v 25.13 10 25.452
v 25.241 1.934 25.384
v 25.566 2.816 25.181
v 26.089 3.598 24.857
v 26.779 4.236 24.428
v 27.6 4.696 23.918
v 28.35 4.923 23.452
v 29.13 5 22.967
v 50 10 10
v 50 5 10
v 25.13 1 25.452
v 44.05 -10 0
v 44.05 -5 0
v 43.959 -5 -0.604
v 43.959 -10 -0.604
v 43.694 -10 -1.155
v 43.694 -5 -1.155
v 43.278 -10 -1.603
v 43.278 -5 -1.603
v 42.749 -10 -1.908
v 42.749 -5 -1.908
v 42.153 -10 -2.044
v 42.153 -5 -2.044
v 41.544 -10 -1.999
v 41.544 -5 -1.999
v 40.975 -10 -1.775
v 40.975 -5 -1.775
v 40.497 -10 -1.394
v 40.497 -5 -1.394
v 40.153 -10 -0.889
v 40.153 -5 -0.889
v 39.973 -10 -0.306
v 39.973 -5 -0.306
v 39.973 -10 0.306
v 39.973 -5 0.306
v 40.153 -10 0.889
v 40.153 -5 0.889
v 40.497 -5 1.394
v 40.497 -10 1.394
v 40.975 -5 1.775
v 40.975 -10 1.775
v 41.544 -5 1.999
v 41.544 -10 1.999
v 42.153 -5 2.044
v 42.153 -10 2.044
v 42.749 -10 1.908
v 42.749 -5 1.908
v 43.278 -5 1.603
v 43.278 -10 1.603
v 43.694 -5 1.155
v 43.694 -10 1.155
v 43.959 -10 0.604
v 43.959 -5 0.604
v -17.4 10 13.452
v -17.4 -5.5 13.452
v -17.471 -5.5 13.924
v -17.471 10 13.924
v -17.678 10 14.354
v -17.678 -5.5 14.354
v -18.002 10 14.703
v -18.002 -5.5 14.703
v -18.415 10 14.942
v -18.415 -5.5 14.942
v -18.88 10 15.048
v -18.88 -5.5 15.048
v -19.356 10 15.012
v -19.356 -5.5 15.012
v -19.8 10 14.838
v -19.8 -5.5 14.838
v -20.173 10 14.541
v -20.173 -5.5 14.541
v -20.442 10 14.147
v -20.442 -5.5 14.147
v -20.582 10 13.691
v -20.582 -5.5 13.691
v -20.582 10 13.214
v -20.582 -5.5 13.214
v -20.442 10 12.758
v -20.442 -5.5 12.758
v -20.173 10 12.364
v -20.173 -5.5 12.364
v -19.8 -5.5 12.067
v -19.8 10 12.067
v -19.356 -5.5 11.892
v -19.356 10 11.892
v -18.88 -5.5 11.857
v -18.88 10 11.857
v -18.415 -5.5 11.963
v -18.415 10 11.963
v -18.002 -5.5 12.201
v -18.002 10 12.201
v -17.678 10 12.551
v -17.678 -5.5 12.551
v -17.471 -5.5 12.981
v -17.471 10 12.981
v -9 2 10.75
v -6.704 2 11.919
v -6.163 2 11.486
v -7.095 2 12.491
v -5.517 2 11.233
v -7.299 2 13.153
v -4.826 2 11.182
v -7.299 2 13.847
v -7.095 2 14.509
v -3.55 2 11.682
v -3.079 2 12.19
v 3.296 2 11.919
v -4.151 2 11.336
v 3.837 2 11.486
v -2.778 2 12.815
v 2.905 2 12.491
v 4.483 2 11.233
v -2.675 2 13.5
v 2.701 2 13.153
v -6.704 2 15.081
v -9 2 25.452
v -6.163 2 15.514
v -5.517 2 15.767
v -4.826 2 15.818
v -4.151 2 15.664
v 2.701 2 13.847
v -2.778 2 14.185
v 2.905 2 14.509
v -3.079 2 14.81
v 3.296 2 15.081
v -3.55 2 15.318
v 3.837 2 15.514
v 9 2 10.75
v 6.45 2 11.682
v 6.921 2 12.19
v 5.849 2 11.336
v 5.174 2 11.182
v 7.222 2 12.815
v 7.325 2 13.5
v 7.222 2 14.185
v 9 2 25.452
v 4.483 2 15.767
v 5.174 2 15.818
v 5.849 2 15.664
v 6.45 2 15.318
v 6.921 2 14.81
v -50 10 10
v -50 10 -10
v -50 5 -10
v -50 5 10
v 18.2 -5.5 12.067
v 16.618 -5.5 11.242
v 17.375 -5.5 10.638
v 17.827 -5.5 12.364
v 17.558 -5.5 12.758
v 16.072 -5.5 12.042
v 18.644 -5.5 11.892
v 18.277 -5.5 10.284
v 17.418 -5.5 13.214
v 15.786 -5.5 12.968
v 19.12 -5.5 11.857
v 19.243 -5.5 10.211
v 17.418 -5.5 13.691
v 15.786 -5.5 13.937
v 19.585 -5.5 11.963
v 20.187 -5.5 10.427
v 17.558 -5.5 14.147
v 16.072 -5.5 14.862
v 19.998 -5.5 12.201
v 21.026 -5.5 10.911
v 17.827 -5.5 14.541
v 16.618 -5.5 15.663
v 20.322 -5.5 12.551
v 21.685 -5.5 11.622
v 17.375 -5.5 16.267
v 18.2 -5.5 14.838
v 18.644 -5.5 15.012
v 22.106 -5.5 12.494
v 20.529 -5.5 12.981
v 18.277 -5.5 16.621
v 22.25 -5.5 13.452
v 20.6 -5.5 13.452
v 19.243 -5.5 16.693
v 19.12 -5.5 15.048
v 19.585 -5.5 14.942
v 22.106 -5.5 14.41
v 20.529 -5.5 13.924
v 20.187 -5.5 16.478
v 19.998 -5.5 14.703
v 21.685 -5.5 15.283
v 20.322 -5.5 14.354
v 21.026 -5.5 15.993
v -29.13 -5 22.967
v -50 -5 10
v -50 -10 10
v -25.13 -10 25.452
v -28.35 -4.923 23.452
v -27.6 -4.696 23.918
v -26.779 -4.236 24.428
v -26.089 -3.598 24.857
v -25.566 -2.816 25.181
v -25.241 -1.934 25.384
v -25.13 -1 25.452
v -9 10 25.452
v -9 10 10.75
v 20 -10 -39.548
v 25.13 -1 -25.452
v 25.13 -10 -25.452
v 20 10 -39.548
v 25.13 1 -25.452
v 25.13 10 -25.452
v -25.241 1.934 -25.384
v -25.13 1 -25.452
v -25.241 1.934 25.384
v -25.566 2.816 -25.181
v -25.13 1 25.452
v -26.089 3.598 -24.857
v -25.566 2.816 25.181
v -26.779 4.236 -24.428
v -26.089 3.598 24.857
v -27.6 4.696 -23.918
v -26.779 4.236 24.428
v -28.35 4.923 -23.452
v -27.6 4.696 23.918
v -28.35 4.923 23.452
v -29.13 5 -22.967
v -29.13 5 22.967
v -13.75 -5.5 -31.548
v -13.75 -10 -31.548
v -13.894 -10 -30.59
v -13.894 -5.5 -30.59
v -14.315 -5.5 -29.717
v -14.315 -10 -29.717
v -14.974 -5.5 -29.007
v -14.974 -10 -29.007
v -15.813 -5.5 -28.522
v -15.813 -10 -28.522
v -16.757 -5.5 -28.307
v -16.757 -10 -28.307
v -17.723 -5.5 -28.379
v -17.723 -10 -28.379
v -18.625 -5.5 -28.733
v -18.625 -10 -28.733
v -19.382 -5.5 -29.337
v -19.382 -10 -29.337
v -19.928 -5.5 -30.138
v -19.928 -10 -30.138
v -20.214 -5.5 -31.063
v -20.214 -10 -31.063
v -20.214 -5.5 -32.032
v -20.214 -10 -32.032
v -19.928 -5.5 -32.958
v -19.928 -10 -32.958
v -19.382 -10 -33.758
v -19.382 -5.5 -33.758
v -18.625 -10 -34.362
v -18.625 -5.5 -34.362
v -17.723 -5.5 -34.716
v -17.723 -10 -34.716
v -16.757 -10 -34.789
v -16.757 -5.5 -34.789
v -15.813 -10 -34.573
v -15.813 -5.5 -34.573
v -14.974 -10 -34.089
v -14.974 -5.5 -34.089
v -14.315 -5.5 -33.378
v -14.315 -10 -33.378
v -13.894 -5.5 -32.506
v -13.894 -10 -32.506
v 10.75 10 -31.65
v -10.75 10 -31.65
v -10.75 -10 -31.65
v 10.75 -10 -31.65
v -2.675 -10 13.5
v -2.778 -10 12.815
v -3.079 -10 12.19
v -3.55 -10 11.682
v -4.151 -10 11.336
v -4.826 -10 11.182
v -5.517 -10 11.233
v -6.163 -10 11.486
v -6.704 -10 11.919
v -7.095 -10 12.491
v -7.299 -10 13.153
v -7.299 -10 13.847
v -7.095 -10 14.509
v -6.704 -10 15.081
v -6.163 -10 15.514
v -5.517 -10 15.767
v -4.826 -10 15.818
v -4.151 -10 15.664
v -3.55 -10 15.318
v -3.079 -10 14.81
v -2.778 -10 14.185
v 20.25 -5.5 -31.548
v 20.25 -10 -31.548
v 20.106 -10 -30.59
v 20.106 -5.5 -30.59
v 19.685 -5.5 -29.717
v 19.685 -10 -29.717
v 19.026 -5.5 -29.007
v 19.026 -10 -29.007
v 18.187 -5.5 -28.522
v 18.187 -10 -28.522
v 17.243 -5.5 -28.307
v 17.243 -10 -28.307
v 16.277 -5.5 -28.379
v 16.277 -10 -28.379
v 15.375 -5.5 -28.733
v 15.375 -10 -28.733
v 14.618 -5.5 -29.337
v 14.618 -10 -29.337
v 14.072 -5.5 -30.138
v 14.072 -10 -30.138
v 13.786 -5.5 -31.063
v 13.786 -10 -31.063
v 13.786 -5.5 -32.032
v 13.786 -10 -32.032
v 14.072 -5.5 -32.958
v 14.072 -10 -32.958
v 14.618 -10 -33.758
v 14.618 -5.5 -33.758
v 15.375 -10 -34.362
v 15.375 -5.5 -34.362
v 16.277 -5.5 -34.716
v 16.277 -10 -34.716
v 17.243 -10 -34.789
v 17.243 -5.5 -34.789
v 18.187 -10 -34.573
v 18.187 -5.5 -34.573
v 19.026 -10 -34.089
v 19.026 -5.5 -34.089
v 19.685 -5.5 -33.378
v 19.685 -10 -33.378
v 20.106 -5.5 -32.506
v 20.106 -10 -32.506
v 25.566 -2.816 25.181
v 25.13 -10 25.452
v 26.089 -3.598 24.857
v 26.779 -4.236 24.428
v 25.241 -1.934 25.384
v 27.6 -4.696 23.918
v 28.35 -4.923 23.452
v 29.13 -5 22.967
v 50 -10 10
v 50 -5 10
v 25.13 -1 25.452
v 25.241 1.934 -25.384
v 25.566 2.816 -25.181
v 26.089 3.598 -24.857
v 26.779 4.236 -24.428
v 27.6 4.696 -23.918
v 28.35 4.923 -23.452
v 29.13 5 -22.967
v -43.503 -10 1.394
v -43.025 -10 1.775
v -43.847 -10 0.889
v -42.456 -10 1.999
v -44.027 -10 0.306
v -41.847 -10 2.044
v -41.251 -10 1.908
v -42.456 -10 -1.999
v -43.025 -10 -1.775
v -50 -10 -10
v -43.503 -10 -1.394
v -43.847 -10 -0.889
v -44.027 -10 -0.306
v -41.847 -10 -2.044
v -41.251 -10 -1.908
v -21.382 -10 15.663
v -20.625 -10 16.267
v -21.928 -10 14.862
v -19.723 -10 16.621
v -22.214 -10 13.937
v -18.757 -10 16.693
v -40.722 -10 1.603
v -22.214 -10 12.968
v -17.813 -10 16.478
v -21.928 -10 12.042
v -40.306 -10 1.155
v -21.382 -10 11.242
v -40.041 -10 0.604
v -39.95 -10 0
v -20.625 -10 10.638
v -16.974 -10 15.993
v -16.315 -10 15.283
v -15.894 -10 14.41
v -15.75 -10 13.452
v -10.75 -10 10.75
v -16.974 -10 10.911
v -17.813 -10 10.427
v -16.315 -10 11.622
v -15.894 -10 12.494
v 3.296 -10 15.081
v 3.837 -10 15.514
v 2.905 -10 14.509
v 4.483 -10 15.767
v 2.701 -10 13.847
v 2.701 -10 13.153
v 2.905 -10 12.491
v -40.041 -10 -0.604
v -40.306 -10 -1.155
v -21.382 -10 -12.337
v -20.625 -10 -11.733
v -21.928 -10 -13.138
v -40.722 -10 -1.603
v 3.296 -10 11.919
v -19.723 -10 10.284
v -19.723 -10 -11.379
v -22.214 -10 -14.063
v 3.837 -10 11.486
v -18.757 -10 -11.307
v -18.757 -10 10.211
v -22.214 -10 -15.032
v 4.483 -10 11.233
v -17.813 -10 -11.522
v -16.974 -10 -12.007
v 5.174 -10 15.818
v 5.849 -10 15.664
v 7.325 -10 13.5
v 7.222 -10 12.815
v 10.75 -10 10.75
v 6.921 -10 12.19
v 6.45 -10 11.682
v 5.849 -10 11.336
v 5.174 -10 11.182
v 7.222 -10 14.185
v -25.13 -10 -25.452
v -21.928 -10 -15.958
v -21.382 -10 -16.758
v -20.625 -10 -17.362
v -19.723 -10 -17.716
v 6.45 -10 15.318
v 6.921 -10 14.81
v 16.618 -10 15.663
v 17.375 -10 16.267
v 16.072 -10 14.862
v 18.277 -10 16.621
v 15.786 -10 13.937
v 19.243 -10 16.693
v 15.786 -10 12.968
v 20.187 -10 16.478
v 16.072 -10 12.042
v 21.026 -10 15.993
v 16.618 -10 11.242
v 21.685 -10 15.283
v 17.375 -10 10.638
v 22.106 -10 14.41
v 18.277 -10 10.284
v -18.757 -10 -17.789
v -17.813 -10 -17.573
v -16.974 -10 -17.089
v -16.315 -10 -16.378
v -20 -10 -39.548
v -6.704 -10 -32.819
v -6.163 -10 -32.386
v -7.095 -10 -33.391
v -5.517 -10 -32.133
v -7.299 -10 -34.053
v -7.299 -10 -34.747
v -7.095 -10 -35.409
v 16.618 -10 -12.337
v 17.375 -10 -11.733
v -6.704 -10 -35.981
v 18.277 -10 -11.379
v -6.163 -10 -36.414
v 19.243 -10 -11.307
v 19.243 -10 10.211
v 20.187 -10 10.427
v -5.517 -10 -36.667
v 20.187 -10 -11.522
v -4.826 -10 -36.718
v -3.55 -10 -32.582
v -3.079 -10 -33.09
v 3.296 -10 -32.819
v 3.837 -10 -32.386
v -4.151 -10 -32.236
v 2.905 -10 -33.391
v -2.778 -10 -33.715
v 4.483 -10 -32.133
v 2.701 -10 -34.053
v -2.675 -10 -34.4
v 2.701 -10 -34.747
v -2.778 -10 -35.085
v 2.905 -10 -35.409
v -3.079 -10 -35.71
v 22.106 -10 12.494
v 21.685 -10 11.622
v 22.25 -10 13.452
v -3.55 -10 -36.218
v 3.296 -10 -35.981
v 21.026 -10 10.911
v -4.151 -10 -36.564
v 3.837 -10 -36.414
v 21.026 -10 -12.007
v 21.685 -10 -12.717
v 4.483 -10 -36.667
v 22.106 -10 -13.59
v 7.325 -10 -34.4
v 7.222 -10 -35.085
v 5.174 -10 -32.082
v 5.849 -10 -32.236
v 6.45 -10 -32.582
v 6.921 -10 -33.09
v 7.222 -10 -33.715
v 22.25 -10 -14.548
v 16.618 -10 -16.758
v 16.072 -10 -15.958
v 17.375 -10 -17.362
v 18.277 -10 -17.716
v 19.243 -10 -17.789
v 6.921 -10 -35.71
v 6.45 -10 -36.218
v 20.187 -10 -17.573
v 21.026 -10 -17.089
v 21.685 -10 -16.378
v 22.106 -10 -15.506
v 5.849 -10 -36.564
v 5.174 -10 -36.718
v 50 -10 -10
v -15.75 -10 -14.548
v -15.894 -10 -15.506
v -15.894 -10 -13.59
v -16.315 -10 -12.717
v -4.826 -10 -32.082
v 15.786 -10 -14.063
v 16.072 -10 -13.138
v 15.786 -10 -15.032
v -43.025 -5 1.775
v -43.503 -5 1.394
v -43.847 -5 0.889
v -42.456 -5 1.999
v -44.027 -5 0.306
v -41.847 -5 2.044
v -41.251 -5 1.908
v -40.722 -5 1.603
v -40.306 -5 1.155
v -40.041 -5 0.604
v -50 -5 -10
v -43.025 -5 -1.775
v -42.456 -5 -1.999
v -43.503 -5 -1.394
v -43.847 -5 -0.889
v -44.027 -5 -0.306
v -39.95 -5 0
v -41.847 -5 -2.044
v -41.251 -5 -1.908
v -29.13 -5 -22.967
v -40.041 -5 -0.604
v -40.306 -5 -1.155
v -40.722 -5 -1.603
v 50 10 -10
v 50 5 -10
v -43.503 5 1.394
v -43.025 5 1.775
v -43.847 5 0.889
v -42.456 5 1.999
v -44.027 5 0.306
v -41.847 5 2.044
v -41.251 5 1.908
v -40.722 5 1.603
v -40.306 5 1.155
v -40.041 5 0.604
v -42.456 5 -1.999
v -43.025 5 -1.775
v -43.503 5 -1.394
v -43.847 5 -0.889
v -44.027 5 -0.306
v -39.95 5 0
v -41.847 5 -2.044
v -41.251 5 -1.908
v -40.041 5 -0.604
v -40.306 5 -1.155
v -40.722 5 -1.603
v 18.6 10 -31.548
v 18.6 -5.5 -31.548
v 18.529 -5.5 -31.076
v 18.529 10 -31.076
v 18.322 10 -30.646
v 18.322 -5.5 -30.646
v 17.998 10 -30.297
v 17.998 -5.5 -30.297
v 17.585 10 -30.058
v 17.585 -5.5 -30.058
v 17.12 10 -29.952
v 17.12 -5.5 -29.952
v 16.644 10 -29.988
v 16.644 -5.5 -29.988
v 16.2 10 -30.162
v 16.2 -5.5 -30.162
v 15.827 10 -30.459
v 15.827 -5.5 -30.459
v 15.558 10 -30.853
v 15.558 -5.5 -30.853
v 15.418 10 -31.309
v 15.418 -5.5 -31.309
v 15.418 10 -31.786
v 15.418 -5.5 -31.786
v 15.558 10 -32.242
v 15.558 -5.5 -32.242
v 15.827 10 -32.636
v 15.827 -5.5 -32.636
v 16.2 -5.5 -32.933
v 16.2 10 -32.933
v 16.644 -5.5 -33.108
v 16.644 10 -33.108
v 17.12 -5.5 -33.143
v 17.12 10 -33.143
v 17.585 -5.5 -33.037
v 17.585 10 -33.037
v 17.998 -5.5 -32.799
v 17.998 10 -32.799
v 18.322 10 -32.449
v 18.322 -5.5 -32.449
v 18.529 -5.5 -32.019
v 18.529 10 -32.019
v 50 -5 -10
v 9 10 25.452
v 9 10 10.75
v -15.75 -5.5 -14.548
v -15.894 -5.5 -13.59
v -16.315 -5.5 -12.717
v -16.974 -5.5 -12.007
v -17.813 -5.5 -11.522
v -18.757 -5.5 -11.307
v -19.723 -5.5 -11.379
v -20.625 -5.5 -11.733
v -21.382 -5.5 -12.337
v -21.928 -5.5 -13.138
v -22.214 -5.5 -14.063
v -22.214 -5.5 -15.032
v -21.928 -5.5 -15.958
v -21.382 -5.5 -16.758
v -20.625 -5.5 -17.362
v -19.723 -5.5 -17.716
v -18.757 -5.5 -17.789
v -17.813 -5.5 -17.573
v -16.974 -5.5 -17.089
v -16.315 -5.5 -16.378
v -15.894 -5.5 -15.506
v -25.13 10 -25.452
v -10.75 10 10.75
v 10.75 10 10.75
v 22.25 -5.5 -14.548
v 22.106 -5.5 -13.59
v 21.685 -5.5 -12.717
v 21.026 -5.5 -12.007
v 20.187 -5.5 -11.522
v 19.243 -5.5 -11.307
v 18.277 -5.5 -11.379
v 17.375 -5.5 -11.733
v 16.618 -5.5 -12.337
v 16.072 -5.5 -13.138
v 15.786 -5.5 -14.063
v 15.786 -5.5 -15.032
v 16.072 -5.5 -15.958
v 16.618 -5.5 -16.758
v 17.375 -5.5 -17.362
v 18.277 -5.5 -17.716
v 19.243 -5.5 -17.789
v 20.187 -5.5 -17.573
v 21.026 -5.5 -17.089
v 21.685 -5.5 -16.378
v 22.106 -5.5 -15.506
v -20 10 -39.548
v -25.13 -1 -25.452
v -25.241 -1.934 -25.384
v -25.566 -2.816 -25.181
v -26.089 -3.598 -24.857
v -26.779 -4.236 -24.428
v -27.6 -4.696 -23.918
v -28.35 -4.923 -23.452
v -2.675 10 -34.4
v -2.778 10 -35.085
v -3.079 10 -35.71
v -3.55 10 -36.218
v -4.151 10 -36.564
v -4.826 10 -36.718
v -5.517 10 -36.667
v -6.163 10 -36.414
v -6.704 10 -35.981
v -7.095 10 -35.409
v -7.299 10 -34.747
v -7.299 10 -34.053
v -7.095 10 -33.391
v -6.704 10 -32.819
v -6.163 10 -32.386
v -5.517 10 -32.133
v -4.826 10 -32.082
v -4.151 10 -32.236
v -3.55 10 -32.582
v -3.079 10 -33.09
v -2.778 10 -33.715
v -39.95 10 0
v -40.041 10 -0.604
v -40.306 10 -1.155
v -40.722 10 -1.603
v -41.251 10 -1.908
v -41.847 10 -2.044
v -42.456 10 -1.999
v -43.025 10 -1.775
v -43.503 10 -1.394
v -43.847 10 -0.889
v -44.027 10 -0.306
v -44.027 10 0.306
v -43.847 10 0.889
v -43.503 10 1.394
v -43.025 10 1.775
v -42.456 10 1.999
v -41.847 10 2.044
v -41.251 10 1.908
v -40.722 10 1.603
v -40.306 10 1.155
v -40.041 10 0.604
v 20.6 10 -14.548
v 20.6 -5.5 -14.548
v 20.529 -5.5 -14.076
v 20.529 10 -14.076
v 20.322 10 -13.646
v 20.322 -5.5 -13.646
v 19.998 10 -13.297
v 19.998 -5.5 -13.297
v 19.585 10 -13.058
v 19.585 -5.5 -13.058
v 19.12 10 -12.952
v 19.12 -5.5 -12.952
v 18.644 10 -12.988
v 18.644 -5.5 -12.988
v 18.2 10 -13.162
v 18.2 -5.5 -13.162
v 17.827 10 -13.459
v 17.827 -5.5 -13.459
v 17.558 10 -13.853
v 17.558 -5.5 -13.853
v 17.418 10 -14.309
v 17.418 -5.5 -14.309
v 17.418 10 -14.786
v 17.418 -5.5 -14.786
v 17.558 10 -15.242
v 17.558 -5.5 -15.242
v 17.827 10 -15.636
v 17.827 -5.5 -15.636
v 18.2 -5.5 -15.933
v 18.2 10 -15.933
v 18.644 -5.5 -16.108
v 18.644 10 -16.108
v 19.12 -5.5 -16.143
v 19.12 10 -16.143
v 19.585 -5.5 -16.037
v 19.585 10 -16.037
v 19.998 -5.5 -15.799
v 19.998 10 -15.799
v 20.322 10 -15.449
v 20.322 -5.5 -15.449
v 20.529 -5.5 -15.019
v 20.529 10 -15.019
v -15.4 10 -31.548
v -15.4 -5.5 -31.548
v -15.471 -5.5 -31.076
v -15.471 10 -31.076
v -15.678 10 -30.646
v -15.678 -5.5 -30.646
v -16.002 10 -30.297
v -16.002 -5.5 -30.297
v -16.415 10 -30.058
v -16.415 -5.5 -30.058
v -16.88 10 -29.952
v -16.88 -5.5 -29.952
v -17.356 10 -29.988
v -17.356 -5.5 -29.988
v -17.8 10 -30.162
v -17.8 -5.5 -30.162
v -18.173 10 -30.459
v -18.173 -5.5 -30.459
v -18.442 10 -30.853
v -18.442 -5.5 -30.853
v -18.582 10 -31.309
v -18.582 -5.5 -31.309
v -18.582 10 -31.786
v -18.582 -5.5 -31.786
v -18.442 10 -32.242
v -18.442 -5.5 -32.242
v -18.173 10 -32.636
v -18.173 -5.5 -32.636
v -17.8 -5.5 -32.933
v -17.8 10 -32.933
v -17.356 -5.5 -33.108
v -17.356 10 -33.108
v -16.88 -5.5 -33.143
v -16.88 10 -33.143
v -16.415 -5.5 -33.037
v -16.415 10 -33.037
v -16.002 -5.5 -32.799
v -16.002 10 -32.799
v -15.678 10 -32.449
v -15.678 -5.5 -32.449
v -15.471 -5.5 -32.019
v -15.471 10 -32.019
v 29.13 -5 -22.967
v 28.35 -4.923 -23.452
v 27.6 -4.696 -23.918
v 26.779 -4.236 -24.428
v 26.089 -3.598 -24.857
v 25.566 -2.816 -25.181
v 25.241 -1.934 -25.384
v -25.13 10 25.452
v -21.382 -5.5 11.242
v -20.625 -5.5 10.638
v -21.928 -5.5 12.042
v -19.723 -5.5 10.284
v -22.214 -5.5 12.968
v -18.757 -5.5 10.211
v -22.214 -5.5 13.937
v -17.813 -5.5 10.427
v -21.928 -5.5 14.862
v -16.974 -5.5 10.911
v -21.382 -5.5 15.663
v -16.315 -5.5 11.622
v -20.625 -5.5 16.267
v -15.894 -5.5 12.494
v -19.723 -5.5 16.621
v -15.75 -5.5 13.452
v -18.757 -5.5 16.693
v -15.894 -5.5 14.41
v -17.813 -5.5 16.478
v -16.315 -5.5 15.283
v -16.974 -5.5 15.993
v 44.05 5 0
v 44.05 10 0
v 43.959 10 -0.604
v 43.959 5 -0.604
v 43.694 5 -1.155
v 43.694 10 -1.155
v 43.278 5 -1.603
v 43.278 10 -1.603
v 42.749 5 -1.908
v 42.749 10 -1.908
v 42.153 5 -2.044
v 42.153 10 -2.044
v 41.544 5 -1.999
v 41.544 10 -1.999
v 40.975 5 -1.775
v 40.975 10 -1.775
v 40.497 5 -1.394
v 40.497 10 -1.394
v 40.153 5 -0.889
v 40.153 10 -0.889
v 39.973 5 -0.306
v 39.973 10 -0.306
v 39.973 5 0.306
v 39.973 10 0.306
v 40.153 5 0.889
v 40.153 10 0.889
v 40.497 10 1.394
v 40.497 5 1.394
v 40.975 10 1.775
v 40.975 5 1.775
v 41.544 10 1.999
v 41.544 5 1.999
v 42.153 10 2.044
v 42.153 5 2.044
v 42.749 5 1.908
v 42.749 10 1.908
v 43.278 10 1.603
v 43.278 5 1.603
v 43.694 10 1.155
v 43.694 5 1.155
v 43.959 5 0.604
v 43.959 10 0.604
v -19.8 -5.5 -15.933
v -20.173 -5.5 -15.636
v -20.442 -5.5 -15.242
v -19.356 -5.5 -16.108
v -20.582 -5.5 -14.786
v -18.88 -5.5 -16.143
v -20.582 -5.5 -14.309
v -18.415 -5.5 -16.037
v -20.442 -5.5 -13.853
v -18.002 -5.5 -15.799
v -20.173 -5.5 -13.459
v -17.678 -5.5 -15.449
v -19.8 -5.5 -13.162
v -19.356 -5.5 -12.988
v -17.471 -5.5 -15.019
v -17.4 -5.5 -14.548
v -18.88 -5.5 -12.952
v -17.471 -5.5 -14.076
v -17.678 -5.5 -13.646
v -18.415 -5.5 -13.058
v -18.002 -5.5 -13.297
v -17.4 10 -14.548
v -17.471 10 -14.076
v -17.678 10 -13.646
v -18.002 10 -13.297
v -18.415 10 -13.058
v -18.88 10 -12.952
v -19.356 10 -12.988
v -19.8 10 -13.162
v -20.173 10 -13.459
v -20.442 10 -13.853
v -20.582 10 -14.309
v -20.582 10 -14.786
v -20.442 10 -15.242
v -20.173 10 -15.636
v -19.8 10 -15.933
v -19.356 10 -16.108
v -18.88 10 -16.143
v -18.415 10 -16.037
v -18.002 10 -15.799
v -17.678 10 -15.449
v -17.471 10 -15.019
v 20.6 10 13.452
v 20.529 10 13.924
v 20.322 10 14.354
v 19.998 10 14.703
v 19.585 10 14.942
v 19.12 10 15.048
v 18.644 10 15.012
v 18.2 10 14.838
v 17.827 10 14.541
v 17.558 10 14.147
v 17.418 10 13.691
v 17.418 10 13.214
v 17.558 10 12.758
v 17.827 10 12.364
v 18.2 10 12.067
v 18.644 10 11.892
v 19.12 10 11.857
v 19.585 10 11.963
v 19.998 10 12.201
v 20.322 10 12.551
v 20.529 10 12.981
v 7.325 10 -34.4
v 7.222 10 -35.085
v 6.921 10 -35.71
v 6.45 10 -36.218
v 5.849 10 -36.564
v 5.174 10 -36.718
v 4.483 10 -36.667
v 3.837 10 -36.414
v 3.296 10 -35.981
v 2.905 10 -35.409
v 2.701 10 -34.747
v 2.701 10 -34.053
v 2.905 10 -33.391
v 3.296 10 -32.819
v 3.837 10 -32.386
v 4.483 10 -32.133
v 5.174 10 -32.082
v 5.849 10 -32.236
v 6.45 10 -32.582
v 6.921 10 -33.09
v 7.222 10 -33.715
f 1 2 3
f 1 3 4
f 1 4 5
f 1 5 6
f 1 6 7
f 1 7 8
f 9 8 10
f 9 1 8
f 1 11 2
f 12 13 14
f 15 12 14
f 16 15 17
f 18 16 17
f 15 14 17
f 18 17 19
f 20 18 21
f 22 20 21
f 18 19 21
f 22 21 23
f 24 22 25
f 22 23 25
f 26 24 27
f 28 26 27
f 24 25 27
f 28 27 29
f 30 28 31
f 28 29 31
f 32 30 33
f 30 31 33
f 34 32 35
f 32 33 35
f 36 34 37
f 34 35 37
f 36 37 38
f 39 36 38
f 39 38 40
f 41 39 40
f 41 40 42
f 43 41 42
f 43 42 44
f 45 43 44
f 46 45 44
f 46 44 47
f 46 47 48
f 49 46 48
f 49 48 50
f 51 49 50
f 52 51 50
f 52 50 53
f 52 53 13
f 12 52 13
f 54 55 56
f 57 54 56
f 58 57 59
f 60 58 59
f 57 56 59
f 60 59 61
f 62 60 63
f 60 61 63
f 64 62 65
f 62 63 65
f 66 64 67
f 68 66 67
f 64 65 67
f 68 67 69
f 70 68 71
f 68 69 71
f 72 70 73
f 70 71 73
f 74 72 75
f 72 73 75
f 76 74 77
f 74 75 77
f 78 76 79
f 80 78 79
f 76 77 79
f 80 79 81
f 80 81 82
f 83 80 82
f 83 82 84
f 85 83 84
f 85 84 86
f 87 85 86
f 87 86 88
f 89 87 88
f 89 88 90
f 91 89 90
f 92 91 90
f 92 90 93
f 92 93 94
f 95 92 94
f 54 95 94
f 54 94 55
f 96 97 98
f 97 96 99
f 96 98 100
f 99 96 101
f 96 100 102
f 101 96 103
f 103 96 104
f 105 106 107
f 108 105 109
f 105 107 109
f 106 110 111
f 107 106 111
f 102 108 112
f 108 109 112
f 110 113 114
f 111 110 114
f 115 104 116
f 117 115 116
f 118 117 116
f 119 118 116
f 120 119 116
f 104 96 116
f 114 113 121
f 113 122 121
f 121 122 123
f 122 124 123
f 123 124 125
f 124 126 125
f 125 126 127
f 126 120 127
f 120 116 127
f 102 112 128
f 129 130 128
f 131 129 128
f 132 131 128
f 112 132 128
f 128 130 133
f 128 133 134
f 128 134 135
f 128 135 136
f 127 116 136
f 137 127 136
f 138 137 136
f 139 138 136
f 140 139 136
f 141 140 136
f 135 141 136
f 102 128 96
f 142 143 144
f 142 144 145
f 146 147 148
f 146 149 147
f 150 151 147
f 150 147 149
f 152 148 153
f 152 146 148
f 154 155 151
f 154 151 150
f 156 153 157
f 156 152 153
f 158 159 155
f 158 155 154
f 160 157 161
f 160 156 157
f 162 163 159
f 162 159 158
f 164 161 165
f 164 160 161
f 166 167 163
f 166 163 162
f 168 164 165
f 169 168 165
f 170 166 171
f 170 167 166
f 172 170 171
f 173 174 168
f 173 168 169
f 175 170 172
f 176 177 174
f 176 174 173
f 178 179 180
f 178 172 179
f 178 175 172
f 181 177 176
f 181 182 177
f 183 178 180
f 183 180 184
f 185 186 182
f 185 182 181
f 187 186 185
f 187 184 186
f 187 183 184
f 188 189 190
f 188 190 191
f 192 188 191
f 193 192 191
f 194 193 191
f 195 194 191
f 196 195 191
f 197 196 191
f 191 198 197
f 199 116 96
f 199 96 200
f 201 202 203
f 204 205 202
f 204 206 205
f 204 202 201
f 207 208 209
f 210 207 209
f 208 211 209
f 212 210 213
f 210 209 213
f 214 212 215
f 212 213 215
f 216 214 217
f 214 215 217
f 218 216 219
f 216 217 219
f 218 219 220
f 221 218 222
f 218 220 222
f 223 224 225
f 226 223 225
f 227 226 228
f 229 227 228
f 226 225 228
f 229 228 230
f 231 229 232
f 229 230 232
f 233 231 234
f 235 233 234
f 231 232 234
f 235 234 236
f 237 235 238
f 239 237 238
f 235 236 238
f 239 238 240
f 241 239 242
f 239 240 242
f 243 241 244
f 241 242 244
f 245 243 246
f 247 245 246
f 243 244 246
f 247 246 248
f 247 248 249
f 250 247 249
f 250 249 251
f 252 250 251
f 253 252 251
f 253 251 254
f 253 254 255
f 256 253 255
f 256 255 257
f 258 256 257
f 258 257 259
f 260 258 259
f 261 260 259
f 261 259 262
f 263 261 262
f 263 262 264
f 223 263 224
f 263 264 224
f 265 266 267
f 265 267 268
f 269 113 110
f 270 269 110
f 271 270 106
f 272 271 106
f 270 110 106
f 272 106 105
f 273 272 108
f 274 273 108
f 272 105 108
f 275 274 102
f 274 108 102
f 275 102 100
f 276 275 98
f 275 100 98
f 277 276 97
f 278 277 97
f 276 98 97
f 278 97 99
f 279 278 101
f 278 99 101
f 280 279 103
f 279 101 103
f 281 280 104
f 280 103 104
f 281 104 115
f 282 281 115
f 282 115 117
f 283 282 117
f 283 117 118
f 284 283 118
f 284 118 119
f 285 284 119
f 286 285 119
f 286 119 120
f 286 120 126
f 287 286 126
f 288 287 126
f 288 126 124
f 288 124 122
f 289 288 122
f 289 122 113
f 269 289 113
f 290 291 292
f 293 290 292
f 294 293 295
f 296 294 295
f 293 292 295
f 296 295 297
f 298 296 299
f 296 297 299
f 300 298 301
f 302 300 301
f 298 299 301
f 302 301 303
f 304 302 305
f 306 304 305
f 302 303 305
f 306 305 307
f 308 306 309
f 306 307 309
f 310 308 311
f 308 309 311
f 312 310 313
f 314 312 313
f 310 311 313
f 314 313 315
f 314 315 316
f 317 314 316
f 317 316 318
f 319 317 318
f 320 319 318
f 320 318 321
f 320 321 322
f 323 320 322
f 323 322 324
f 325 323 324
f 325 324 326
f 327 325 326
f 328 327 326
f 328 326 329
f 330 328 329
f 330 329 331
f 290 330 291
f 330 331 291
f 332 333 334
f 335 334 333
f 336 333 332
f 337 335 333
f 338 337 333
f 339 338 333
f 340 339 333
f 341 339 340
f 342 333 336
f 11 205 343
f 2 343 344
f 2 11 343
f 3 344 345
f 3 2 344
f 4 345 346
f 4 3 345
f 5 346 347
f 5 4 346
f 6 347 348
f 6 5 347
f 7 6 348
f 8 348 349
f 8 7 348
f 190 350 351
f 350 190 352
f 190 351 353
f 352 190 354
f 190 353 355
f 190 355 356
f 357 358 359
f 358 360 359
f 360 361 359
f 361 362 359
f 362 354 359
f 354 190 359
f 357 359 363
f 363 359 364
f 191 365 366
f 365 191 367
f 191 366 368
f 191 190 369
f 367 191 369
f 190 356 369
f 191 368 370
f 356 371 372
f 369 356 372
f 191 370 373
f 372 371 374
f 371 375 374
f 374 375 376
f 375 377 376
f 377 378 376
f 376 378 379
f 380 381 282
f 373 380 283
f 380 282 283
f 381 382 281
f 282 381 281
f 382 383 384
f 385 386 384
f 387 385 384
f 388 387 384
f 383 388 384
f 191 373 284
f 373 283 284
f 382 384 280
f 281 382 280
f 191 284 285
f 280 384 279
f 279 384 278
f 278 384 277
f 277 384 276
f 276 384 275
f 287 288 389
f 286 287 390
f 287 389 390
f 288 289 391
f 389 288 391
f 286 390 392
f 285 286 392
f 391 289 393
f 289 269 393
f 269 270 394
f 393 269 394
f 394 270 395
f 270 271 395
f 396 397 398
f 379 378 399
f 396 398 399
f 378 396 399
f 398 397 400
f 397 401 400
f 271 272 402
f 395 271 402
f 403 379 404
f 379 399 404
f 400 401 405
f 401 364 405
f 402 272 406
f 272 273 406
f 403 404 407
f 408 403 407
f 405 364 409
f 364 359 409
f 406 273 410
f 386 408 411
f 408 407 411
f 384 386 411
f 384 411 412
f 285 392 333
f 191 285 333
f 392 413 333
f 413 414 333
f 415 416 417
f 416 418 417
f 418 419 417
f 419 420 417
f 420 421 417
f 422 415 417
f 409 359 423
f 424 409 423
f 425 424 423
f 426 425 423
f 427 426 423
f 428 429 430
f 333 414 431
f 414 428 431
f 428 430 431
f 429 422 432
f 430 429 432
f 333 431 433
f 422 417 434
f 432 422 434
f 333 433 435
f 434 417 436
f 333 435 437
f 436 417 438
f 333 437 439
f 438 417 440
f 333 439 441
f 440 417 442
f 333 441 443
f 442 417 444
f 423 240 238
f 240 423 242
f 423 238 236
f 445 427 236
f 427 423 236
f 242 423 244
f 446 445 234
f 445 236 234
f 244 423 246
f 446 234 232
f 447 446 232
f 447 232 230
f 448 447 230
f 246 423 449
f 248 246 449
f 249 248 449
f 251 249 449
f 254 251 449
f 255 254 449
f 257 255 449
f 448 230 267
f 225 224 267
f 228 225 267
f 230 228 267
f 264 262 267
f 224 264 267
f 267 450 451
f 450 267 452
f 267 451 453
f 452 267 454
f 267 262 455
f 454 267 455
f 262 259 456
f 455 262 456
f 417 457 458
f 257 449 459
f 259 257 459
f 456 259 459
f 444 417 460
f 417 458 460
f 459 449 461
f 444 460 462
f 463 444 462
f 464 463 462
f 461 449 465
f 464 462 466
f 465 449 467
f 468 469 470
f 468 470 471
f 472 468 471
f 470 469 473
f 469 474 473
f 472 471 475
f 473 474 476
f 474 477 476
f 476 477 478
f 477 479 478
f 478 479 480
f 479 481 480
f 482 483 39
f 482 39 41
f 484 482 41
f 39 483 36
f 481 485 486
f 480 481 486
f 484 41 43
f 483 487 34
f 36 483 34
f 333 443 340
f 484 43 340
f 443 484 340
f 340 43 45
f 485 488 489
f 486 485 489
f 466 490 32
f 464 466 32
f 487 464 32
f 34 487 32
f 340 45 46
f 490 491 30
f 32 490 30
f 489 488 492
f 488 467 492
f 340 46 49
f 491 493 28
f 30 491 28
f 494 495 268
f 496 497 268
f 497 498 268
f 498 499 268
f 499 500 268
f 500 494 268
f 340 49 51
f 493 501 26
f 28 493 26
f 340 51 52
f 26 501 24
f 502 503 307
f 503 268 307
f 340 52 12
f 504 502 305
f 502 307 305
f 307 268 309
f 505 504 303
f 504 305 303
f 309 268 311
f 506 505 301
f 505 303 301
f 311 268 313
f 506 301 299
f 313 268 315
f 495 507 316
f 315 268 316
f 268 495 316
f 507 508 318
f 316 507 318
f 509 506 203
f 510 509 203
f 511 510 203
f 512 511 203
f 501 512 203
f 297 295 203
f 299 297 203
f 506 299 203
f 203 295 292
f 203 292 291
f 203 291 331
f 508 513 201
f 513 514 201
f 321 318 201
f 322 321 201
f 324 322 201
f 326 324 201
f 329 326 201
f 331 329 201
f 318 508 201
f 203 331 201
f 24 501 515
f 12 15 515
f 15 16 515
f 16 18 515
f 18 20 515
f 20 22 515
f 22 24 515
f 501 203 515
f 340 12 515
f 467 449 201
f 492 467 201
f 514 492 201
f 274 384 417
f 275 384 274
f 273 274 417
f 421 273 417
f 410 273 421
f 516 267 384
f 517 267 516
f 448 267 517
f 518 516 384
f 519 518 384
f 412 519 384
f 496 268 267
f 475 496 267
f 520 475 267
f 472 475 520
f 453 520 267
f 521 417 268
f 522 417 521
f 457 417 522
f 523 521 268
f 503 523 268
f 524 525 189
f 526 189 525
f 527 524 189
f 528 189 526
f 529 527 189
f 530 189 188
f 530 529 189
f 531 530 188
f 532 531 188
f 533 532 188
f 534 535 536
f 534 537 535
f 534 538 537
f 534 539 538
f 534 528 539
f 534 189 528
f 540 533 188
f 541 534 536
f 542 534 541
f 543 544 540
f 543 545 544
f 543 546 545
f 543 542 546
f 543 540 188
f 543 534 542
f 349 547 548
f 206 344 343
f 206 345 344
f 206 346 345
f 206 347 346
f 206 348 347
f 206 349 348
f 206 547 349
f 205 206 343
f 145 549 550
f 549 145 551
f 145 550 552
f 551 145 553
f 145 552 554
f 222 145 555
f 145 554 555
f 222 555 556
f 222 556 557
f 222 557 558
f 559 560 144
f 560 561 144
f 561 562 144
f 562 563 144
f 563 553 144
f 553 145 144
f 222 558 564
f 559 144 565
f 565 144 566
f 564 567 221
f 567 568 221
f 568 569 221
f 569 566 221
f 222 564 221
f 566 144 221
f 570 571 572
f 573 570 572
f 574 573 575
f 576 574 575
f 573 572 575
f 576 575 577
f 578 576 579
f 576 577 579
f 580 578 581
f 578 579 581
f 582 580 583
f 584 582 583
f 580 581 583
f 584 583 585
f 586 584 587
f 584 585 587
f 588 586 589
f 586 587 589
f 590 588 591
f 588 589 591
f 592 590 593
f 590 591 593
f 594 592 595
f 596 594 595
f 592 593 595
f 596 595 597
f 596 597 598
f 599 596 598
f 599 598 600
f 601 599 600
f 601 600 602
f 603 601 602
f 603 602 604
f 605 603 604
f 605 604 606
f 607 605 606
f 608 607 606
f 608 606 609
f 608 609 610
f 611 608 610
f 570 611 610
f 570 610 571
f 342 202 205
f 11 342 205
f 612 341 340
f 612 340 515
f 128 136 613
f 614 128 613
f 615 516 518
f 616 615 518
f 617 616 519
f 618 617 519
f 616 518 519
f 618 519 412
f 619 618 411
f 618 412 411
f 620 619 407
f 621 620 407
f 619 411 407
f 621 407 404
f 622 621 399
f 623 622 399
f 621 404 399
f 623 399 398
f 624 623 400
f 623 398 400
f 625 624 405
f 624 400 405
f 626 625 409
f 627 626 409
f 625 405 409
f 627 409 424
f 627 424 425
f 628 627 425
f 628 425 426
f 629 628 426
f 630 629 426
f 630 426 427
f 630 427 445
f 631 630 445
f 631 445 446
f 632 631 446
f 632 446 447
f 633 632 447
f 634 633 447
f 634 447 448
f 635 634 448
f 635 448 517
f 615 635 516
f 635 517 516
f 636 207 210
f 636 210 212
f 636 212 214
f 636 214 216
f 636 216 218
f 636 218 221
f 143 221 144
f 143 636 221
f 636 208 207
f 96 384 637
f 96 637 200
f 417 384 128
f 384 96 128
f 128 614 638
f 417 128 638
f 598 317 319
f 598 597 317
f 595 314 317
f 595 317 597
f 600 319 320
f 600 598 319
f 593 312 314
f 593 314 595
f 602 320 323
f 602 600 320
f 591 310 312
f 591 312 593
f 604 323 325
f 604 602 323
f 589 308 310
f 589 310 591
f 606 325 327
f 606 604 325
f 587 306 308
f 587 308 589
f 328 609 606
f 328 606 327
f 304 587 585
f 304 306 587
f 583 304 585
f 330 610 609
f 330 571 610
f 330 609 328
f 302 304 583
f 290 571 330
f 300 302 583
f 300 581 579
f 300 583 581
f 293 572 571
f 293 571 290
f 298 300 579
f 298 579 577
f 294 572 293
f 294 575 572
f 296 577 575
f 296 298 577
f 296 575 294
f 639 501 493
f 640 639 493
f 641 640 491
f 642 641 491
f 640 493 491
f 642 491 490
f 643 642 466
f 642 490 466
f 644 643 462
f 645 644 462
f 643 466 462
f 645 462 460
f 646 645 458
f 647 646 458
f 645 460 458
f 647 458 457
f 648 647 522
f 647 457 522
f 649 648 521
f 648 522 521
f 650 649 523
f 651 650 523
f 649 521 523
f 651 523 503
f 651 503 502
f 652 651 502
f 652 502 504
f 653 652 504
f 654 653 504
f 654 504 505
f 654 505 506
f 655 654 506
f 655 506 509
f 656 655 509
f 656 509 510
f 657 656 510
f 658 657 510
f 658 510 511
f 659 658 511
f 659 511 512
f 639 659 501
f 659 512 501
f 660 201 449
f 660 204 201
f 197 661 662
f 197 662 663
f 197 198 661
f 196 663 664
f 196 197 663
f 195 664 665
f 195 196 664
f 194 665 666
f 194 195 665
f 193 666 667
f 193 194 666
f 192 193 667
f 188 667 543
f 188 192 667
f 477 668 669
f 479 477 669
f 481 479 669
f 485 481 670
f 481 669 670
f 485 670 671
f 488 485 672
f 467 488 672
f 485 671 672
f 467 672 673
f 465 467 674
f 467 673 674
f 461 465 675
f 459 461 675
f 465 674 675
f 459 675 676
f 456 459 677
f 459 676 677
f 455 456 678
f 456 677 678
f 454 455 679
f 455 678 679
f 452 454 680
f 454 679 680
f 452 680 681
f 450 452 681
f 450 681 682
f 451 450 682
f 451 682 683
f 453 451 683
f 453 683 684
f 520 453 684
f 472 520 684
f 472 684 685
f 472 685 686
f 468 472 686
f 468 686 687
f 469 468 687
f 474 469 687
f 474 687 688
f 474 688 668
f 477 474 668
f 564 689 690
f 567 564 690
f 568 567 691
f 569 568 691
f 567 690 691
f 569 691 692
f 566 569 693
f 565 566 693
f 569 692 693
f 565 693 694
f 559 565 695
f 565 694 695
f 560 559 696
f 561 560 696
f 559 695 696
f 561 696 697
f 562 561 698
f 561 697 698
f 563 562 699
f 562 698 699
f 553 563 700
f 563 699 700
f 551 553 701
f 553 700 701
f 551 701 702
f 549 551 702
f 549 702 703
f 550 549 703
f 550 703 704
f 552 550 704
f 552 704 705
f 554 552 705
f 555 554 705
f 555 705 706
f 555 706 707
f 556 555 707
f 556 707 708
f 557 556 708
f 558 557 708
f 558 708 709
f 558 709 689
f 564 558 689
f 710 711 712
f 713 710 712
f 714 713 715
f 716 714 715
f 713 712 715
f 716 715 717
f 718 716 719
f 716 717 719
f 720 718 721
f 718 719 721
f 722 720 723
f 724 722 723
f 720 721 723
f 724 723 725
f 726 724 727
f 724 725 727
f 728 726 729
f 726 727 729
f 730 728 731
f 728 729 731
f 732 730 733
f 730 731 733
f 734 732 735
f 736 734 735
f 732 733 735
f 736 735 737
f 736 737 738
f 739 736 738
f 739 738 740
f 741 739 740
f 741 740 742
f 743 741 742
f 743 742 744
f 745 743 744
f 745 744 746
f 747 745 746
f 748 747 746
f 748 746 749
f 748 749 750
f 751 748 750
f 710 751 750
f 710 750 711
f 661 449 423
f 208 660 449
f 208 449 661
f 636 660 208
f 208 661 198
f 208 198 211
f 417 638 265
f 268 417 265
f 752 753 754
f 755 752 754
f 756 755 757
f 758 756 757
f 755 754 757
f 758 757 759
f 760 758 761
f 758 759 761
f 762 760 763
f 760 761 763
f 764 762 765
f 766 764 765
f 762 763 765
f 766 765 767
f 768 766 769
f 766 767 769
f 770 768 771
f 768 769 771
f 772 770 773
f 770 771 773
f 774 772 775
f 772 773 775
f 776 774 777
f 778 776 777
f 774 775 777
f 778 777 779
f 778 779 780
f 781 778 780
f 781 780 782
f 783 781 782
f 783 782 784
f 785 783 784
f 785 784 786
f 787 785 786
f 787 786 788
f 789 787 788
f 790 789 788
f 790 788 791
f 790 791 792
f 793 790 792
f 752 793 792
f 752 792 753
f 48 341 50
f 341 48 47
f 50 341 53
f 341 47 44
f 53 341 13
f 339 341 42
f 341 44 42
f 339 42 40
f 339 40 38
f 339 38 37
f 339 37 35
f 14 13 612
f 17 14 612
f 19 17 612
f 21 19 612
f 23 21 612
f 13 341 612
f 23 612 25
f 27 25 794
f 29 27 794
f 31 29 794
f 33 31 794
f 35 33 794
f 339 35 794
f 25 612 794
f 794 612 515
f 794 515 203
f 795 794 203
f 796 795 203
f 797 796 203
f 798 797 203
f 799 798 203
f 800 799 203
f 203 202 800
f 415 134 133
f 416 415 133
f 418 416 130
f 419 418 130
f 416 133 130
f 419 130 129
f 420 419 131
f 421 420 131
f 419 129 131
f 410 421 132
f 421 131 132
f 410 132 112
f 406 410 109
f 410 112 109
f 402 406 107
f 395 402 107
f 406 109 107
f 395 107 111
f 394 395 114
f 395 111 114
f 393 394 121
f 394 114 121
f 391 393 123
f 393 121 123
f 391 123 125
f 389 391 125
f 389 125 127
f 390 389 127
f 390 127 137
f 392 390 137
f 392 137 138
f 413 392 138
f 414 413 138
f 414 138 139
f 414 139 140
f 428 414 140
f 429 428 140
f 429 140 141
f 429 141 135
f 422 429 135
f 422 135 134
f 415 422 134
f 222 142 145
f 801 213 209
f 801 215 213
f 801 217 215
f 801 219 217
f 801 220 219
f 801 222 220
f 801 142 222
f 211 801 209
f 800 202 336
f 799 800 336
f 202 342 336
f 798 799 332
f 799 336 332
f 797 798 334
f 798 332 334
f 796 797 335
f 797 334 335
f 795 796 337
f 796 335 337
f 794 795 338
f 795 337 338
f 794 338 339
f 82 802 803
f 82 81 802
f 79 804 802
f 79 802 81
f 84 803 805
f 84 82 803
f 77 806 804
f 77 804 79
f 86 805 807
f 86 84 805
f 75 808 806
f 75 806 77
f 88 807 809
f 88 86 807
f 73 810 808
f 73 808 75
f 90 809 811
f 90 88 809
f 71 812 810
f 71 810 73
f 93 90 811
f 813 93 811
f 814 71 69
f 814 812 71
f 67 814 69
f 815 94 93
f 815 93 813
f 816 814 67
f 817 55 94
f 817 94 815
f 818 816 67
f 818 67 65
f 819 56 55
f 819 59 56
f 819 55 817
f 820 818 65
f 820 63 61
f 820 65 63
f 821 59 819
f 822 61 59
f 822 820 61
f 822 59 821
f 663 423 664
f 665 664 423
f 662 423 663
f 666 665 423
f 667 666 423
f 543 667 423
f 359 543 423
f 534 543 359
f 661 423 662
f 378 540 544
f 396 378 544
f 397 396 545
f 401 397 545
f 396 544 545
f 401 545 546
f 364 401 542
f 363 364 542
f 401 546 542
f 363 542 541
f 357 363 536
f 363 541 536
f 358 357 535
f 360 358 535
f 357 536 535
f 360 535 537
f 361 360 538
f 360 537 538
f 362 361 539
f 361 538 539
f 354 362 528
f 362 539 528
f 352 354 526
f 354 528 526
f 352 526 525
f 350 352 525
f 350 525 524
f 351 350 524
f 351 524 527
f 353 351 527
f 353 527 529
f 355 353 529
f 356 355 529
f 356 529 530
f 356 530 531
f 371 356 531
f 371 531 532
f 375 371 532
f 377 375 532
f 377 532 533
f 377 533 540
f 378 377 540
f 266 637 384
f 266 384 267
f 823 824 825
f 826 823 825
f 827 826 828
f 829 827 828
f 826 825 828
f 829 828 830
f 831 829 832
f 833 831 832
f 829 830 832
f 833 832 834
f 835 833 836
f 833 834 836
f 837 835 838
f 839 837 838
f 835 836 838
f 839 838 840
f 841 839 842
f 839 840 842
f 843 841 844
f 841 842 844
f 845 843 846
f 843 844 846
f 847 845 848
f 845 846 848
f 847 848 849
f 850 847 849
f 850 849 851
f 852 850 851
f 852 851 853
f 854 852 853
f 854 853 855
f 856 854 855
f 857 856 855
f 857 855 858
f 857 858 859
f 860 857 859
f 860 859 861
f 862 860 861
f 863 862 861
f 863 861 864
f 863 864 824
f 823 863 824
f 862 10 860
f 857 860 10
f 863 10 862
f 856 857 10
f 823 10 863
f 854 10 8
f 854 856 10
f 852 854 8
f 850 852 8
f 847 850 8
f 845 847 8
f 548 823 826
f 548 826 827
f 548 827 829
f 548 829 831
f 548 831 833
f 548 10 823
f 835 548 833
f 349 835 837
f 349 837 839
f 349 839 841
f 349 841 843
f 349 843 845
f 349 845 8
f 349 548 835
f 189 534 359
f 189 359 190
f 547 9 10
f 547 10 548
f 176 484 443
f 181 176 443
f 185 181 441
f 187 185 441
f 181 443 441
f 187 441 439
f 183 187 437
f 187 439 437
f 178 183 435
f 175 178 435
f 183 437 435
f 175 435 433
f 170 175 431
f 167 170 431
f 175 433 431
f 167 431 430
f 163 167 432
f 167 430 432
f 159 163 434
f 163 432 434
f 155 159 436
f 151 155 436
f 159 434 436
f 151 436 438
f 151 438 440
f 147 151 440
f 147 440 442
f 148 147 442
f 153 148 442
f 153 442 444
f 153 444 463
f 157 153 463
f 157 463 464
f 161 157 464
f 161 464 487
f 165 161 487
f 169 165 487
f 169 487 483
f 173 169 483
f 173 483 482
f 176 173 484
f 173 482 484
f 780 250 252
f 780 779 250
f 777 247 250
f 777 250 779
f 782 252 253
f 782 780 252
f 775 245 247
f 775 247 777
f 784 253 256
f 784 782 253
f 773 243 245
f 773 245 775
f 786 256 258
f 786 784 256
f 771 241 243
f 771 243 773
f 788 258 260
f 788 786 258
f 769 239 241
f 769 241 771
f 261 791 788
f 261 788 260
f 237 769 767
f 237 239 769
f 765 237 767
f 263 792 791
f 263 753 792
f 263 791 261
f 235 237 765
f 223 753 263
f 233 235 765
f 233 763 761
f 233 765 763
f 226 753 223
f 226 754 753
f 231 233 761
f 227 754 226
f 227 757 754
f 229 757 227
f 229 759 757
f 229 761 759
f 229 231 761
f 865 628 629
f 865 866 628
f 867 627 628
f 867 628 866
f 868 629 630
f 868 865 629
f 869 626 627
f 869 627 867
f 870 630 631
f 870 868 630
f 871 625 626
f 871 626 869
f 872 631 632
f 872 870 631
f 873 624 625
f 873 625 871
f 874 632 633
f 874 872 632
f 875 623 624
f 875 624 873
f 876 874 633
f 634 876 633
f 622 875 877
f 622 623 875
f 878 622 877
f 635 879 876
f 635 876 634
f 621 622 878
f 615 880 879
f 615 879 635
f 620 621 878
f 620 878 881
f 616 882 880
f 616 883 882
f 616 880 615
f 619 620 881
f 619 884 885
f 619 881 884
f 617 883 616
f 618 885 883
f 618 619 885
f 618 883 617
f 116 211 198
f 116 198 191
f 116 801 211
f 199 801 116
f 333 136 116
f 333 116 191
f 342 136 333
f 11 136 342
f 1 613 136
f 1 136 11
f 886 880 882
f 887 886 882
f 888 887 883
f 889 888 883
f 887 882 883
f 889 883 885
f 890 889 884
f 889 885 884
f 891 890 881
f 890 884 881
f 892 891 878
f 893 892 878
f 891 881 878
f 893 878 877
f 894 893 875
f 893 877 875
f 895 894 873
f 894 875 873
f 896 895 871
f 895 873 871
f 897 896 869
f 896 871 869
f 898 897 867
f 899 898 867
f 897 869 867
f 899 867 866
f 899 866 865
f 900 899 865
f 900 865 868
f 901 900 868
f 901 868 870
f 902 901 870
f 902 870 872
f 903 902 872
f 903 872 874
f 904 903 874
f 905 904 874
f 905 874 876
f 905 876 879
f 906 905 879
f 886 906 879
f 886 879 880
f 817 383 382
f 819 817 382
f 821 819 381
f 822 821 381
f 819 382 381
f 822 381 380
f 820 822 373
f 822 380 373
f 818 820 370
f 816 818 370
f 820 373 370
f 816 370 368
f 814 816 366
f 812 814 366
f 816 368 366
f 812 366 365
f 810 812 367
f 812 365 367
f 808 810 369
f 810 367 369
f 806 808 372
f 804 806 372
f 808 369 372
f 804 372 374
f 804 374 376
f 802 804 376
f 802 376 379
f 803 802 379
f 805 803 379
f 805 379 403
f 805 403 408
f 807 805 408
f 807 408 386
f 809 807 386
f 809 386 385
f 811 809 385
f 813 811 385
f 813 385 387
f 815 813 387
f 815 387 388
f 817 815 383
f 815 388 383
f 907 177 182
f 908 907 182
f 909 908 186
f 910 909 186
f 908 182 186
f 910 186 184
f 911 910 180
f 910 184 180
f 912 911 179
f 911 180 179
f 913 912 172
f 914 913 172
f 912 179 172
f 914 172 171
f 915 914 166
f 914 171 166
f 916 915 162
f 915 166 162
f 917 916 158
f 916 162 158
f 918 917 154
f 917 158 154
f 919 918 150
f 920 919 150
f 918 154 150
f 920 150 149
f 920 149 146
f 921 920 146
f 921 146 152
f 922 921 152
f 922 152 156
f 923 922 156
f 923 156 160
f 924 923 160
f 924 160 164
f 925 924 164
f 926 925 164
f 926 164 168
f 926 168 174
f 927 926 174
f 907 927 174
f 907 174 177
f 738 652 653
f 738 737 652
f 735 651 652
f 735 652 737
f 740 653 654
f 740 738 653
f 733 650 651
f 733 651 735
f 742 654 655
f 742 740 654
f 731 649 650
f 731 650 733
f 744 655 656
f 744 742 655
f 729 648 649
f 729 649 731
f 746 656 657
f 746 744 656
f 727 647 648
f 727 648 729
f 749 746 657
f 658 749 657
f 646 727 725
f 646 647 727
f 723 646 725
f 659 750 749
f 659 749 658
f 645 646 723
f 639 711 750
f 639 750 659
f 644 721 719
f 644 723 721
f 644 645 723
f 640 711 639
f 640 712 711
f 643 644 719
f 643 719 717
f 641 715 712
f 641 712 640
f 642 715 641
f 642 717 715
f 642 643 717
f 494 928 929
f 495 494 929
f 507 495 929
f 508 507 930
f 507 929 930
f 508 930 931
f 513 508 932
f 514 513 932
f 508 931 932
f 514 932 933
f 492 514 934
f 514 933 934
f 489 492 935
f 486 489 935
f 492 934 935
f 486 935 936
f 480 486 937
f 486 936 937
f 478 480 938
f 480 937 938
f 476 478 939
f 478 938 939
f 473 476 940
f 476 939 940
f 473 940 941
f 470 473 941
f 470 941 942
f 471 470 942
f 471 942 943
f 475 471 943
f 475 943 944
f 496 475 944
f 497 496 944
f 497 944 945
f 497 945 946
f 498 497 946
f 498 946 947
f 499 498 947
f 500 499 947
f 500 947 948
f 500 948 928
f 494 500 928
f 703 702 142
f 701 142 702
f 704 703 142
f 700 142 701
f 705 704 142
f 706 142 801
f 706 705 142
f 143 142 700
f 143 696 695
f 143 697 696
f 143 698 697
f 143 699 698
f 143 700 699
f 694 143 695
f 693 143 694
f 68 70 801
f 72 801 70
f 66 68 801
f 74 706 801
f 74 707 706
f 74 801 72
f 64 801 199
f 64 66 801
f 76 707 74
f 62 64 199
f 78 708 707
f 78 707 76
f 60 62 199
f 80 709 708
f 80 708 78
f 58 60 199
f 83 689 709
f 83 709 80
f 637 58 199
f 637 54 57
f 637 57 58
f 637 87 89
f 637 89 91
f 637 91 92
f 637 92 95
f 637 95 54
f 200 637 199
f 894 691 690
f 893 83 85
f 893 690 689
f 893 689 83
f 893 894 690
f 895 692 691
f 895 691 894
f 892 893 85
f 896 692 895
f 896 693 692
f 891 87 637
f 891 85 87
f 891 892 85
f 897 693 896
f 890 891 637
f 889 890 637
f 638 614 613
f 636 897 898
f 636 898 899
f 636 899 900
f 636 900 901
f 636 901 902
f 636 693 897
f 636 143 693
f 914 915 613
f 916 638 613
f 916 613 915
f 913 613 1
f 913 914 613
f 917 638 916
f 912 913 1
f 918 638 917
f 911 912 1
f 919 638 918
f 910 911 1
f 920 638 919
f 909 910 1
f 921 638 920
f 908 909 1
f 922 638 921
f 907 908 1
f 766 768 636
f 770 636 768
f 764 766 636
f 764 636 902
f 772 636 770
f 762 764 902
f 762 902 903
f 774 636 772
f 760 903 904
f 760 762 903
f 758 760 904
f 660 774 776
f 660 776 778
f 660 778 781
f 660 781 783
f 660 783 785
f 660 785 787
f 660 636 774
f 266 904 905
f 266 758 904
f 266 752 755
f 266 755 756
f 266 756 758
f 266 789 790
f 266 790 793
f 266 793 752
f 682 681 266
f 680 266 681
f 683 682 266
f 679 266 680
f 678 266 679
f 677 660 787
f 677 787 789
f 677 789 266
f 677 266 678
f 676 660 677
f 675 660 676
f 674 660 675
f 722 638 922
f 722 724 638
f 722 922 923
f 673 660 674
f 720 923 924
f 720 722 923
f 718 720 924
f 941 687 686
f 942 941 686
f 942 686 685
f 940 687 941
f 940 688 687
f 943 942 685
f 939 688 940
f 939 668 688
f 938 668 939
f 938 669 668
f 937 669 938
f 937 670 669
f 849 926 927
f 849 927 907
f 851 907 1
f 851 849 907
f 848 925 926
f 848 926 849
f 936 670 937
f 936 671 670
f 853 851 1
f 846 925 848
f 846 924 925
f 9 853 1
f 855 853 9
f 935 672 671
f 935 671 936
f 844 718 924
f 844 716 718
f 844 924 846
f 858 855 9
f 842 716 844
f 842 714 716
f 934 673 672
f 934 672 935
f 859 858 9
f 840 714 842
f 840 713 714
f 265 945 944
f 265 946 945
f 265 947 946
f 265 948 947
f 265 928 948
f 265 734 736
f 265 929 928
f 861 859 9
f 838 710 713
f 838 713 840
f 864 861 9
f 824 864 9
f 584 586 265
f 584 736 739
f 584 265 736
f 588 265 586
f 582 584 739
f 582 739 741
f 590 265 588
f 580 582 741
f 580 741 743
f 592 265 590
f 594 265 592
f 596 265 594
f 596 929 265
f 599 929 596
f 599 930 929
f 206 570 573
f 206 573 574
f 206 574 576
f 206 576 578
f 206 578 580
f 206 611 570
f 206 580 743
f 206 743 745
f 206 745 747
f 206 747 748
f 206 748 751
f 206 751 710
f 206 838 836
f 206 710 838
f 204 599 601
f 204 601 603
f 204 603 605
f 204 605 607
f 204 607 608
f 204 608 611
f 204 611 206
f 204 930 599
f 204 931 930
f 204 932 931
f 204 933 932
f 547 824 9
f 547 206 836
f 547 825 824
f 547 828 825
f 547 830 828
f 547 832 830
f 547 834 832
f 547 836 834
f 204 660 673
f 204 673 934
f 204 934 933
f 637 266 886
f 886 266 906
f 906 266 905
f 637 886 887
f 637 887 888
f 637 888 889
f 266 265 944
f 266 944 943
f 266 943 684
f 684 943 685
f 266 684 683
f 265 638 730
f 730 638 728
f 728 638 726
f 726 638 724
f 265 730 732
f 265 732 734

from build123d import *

# Parameters (mm, degrees)
MAIN_BODY_DEPTH           = 10
SKETCH2_R                 = 2.325
SKETCH2_R_2               = 2.05
SKETCH2_W                 = 21.5
SKETCH2_H                 = 42.4
SERVO_ROTROD_CUTOUT_DEPTH = 30
SKETCH3_W                 = 18
SKETCH3_H                 = 8
SERVO_CABLE_CUTOUT_DEPTH  = 57.102305
CONTROL_ARM_CUTOUT_START  = -66
SKETCH4_W                 = 24.86969785
SKETCH4_H                 = 10
CONTROL_ARM_CUTOUT_DEPTH  = 67
FILLET1_R                 = 4
SKETCH6_R                 = 1.6
MOUNT_HOLES_CHASSIS_DEPTH = 21
SKETCH7_R                 = 3.25
BOLT_HEAD_HOLES_DEPTH     = 4.5


with BuildPart() as part:
    # Sketch1 → Main-Body (new body, symmetric)
    with BuildSketch(Plane(origin=(0, 0, 0), x_dir=(1, 0, 0), z_dir=(0, 1, 0))):
        Polygon((20, 39.547694656), (-20, 39.547694656), (-25.13030215, 25.452305344), (-50, 10), (-50, -10), (-25.13030215, -25.452305344), (25.13030215, -25.452305344), (50, -10), (50, 10), (25.13030215, 25.452305344), align=None)
    extrude(amount=MAIN_BODY_DEPTH, both=True)

    # Sketch2 → Servo&RotRod-Cutout (cut)
    with BuildSketch(Plane(origin=(0, 10, 0), x_dir=(1, 0, 0), z_dir=(0, 1, 0))):
        with Locations((-5, -13.5)):
            Circle(SKETCH2_R)
        with Locations((5, -13.5)):
            Circle(SKETCH2_R)
        with Locations((-5, 34.4)):
            Circle(SKETCH2_R)
        with Locations((5, 34.4)):
            Circle(SKETCH2_R)
        with Locations((-42, 0)):
            Circle(SKETCH2_R_2)
        with Locations((42, 0)):
            Circle(SKETCH2_R_2)
        with Locations((0, 10.45)):
            Rectangle(SKETCH2_W, SKETCH2_H)
    extrude(amount=-SERVO_ROTROD_CUTOUT_DEPTH, mode=Mode.SUBTRACT)

    # Sketch3 → Servo-Cable-Cutout (cut)
    with BuildSketch(Plane.XY.offset(25.452305344)):
        with Locations((0, 6)):
            Rectangle(SKETCH3_W, SKETCH3_H)
    extrude(amount=-SERVO_CABLE_CUTOUT_DEPTH, mode=Mode.SUBTRACT)

    # Sketch4 → Control-Arm-Cutout (cut)
    with BuildSketch(Plane.XY.offset(25.452305344).offset(CONTROL_ARM_CUTOUT_START)):
        with Locations((-37.565151075, 0)):
            Rectangle(SKETCH4_W, SKETCH4_H)
    control_arm_cutout = extrude(amount=CONTROL_ARM_CUTOUT_DEPTH, mode=Mode.SUBTRACT)

    # Mirror1: Control-Arm-Cutout across plane
    add(control_arm_cutout.mirror(Plane(origin=(0, 0, 0), x_dir=(0, 0, 1), z_dir=(1, 0, 0))), mode=Mode.SUBTRACT)

    # Fillet1
    fillet1_edges = [part.edges().sort_by_distance(p)[0] for p in [
        (-25.13030215, 5, 0),
        (-25.13030215, -5, 0),
        (25.13030215, -5, 0),
        (25.13030215, 5, 0),
    ]]
    fillet(fillet1_edges, radius=FILLET1_R)

    # Sketch6 → Mount-Holes-Chassis (cut, through all)
    with BuildSketch(Plane.XZ.offset(10)):
        with Locations((19, -14.547694656)):
            Circle(SKETCH6_R)
        with Locations((19, 13.452305344)):
            Circle(SKETCH6_R)
        with Locations((17, -31.547694656)):
            Circle(SKETCH6_R)
        with Locations((-17, -31.547694656)):
            Circle(SKETCH6_R)
        with Locations((-19, 13.452305344)):
            Circle(SKETCH6_R)
        with Locations((-19, -14.547694656)):
            Circle(SKETCH6_R)
    extrude(amount=-MOUNT_HOLES_CHASSIS_DEPTH, mode=Mode.SUBTRACT)

    # Sketch7 → Bolt-Head-Holes (cut)
    with BuildSketch(Plane.XZ.offset(10)):
        with Locations((17, -31.547694656)):
            Circle(SKETCH7_R)
        with Locations((19, -14.547694656)):
            Circle(SKETCH7_R)
        with Locations((19, 13.452305344)):
            Circle(SKETCH7_R)
        with Locations((-19, 13.452305344)):
            Circle(SKETCH7_R)
        with Locations((-19, -14.547694656)):
            Circle(SKETCH7_R)
        with Locations((-17, -31.547694656)):
            Circle(SKETCH7_R)
    extrude(amount=-BOLT_HEAD_HOLES_DEPTH, mode=Mode.SUBTRACT)


solid = part.part
